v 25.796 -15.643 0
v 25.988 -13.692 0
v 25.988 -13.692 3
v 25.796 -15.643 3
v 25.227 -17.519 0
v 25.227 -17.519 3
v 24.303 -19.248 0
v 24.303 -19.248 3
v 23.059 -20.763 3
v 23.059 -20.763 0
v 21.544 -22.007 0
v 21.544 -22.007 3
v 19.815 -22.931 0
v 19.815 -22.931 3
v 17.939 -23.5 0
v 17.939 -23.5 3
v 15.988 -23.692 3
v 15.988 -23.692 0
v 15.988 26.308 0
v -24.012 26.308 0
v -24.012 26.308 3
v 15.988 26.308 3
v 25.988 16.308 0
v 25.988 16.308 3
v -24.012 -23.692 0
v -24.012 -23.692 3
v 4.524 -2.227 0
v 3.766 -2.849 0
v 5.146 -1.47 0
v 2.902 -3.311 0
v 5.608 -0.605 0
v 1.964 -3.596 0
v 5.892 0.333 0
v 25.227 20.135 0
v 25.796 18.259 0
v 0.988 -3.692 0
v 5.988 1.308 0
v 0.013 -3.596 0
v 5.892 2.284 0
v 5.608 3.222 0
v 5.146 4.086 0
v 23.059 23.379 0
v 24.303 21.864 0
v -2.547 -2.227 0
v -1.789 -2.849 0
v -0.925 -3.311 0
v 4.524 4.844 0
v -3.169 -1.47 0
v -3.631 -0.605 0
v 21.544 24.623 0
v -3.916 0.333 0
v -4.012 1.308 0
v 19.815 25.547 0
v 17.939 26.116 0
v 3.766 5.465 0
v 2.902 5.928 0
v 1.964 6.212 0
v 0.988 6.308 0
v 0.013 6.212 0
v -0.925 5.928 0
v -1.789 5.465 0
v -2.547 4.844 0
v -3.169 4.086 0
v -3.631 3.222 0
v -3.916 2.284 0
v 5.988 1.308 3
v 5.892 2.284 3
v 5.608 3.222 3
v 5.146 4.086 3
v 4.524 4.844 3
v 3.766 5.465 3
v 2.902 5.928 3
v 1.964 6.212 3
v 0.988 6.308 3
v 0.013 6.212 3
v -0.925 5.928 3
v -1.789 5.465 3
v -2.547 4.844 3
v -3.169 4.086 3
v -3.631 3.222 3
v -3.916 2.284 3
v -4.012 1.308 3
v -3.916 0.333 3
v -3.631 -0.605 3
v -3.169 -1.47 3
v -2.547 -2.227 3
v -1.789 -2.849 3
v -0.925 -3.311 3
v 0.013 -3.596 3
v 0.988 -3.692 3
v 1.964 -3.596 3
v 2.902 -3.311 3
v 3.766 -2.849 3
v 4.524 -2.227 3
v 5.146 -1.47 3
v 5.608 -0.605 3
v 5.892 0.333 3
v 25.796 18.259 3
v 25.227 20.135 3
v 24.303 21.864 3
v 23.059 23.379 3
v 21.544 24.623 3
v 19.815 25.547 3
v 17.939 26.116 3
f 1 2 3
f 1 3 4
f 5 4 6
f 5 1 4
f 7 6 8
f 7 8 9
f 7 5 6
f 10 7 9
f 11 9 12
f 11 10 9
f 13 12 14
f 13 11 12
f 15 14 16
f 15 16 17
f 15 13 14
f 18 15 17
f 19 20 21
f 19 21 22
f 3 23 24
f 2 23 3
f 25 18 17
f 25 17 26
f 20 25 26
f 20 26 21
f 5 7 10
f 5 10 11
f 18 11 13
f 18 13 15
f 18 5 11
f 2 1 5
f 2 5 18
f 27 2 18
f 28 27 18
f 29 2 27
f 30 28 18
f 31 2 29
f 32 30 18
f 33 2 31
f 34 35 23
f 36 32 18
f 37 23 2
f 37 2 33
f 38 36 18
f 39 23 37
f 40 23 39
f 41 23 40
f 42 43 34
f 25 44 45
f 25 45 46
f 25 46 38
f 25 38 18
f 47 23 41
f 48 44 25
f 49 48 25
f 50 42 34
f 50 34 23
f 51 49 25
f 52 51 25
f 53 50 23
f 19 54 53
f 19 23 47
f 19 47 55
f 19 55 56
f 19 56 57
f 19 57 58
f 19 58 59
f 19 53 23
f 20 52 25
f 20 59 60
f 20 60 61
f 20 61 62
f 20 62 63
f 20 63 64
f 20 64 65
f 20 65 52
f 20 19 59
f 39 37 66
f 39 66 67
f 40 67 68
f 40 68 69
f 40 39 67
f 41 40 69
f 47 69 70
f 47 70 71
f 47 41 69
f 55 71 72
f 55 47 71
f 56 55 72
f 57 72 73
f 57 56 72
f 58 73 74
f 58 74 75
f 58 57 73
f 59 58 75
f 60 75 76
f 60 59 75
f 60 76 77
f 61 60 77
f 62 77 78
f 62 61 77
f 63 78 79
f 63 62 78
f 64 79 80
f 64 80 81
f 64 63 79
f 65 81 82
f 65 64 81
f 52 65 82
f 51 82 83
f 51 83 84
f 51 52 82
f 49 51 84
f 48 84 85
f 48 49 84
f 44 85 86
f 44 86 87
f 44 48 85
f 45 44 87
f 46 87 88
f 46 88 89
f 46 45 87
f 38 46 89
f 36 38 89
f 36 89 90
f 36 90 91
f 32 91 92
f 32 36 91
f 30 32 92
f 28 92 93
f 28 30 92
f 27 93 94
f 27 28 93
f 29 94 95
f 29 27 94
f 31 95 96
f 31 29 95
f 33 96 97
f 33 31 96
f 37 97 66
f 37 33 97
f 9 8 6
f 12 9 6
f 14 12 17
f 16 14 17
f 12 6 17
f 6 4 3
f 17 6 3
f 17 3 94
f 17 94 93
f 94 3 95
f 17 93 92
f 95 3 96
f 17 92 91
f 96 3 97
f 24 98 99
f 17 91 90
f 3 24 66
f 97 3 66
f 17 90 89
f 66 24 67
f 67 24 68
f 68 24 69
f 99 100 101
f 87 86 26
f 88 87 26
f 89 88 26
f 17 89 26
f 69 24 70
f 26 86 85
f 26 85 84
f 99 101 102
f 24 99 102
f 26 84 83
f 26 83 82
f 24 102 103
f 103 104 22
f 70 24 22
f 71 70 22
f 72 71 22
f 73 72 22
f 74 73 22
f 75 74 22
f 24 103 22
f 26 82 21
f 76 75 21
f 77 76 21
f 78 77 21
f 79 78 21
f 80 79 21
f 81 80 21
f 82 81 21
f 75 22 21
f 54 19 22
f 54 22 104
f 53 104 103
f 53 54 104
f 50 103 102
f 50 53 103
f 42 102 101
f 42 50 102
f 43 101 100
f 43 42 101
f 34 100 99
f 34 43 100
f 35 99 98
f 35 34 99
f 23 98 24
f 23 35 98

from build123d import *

# Parameters (mm, degrees)
SKETCH1_R           = 5
BOSS_EXTRUDE1_DEPTH = 3


with BuildPart() as part:
    # Sketch1 → Boss-Extrude1 (new body)
    with BuildSketch(Plane.XY):
        with BuildLine():
            Line((-24.011627907, 26.308139535), (15.988372093, 26.308139535))
            ThreePointArc((15.988372093, 26.308139535), (23.059439905, 23.379207347), (25.988372093, 16.308139535))
            Line((25.988372093, 16.308139535), (25.988372093, -13.691860465))
            ThreePointArc((25.988372093, -13.691860465), (23.059439905, -20.762928277), (15.988372093, -23.691860465))
            Line((15.988372093, -23.691860465), (-24.011627907, -23.691860465))
            Line((-24.011627907, -23.691860465), (-24.011627907, 26.308139535))
        make_face()
        with Locations((0.988372093, 1.308139535)):
            Circle(SKETCH1_R, mode=Mode.SUBTRACT)
    extrude(amount=BOSS_EXTRUDE1_DEPTH)


solid = part.part
